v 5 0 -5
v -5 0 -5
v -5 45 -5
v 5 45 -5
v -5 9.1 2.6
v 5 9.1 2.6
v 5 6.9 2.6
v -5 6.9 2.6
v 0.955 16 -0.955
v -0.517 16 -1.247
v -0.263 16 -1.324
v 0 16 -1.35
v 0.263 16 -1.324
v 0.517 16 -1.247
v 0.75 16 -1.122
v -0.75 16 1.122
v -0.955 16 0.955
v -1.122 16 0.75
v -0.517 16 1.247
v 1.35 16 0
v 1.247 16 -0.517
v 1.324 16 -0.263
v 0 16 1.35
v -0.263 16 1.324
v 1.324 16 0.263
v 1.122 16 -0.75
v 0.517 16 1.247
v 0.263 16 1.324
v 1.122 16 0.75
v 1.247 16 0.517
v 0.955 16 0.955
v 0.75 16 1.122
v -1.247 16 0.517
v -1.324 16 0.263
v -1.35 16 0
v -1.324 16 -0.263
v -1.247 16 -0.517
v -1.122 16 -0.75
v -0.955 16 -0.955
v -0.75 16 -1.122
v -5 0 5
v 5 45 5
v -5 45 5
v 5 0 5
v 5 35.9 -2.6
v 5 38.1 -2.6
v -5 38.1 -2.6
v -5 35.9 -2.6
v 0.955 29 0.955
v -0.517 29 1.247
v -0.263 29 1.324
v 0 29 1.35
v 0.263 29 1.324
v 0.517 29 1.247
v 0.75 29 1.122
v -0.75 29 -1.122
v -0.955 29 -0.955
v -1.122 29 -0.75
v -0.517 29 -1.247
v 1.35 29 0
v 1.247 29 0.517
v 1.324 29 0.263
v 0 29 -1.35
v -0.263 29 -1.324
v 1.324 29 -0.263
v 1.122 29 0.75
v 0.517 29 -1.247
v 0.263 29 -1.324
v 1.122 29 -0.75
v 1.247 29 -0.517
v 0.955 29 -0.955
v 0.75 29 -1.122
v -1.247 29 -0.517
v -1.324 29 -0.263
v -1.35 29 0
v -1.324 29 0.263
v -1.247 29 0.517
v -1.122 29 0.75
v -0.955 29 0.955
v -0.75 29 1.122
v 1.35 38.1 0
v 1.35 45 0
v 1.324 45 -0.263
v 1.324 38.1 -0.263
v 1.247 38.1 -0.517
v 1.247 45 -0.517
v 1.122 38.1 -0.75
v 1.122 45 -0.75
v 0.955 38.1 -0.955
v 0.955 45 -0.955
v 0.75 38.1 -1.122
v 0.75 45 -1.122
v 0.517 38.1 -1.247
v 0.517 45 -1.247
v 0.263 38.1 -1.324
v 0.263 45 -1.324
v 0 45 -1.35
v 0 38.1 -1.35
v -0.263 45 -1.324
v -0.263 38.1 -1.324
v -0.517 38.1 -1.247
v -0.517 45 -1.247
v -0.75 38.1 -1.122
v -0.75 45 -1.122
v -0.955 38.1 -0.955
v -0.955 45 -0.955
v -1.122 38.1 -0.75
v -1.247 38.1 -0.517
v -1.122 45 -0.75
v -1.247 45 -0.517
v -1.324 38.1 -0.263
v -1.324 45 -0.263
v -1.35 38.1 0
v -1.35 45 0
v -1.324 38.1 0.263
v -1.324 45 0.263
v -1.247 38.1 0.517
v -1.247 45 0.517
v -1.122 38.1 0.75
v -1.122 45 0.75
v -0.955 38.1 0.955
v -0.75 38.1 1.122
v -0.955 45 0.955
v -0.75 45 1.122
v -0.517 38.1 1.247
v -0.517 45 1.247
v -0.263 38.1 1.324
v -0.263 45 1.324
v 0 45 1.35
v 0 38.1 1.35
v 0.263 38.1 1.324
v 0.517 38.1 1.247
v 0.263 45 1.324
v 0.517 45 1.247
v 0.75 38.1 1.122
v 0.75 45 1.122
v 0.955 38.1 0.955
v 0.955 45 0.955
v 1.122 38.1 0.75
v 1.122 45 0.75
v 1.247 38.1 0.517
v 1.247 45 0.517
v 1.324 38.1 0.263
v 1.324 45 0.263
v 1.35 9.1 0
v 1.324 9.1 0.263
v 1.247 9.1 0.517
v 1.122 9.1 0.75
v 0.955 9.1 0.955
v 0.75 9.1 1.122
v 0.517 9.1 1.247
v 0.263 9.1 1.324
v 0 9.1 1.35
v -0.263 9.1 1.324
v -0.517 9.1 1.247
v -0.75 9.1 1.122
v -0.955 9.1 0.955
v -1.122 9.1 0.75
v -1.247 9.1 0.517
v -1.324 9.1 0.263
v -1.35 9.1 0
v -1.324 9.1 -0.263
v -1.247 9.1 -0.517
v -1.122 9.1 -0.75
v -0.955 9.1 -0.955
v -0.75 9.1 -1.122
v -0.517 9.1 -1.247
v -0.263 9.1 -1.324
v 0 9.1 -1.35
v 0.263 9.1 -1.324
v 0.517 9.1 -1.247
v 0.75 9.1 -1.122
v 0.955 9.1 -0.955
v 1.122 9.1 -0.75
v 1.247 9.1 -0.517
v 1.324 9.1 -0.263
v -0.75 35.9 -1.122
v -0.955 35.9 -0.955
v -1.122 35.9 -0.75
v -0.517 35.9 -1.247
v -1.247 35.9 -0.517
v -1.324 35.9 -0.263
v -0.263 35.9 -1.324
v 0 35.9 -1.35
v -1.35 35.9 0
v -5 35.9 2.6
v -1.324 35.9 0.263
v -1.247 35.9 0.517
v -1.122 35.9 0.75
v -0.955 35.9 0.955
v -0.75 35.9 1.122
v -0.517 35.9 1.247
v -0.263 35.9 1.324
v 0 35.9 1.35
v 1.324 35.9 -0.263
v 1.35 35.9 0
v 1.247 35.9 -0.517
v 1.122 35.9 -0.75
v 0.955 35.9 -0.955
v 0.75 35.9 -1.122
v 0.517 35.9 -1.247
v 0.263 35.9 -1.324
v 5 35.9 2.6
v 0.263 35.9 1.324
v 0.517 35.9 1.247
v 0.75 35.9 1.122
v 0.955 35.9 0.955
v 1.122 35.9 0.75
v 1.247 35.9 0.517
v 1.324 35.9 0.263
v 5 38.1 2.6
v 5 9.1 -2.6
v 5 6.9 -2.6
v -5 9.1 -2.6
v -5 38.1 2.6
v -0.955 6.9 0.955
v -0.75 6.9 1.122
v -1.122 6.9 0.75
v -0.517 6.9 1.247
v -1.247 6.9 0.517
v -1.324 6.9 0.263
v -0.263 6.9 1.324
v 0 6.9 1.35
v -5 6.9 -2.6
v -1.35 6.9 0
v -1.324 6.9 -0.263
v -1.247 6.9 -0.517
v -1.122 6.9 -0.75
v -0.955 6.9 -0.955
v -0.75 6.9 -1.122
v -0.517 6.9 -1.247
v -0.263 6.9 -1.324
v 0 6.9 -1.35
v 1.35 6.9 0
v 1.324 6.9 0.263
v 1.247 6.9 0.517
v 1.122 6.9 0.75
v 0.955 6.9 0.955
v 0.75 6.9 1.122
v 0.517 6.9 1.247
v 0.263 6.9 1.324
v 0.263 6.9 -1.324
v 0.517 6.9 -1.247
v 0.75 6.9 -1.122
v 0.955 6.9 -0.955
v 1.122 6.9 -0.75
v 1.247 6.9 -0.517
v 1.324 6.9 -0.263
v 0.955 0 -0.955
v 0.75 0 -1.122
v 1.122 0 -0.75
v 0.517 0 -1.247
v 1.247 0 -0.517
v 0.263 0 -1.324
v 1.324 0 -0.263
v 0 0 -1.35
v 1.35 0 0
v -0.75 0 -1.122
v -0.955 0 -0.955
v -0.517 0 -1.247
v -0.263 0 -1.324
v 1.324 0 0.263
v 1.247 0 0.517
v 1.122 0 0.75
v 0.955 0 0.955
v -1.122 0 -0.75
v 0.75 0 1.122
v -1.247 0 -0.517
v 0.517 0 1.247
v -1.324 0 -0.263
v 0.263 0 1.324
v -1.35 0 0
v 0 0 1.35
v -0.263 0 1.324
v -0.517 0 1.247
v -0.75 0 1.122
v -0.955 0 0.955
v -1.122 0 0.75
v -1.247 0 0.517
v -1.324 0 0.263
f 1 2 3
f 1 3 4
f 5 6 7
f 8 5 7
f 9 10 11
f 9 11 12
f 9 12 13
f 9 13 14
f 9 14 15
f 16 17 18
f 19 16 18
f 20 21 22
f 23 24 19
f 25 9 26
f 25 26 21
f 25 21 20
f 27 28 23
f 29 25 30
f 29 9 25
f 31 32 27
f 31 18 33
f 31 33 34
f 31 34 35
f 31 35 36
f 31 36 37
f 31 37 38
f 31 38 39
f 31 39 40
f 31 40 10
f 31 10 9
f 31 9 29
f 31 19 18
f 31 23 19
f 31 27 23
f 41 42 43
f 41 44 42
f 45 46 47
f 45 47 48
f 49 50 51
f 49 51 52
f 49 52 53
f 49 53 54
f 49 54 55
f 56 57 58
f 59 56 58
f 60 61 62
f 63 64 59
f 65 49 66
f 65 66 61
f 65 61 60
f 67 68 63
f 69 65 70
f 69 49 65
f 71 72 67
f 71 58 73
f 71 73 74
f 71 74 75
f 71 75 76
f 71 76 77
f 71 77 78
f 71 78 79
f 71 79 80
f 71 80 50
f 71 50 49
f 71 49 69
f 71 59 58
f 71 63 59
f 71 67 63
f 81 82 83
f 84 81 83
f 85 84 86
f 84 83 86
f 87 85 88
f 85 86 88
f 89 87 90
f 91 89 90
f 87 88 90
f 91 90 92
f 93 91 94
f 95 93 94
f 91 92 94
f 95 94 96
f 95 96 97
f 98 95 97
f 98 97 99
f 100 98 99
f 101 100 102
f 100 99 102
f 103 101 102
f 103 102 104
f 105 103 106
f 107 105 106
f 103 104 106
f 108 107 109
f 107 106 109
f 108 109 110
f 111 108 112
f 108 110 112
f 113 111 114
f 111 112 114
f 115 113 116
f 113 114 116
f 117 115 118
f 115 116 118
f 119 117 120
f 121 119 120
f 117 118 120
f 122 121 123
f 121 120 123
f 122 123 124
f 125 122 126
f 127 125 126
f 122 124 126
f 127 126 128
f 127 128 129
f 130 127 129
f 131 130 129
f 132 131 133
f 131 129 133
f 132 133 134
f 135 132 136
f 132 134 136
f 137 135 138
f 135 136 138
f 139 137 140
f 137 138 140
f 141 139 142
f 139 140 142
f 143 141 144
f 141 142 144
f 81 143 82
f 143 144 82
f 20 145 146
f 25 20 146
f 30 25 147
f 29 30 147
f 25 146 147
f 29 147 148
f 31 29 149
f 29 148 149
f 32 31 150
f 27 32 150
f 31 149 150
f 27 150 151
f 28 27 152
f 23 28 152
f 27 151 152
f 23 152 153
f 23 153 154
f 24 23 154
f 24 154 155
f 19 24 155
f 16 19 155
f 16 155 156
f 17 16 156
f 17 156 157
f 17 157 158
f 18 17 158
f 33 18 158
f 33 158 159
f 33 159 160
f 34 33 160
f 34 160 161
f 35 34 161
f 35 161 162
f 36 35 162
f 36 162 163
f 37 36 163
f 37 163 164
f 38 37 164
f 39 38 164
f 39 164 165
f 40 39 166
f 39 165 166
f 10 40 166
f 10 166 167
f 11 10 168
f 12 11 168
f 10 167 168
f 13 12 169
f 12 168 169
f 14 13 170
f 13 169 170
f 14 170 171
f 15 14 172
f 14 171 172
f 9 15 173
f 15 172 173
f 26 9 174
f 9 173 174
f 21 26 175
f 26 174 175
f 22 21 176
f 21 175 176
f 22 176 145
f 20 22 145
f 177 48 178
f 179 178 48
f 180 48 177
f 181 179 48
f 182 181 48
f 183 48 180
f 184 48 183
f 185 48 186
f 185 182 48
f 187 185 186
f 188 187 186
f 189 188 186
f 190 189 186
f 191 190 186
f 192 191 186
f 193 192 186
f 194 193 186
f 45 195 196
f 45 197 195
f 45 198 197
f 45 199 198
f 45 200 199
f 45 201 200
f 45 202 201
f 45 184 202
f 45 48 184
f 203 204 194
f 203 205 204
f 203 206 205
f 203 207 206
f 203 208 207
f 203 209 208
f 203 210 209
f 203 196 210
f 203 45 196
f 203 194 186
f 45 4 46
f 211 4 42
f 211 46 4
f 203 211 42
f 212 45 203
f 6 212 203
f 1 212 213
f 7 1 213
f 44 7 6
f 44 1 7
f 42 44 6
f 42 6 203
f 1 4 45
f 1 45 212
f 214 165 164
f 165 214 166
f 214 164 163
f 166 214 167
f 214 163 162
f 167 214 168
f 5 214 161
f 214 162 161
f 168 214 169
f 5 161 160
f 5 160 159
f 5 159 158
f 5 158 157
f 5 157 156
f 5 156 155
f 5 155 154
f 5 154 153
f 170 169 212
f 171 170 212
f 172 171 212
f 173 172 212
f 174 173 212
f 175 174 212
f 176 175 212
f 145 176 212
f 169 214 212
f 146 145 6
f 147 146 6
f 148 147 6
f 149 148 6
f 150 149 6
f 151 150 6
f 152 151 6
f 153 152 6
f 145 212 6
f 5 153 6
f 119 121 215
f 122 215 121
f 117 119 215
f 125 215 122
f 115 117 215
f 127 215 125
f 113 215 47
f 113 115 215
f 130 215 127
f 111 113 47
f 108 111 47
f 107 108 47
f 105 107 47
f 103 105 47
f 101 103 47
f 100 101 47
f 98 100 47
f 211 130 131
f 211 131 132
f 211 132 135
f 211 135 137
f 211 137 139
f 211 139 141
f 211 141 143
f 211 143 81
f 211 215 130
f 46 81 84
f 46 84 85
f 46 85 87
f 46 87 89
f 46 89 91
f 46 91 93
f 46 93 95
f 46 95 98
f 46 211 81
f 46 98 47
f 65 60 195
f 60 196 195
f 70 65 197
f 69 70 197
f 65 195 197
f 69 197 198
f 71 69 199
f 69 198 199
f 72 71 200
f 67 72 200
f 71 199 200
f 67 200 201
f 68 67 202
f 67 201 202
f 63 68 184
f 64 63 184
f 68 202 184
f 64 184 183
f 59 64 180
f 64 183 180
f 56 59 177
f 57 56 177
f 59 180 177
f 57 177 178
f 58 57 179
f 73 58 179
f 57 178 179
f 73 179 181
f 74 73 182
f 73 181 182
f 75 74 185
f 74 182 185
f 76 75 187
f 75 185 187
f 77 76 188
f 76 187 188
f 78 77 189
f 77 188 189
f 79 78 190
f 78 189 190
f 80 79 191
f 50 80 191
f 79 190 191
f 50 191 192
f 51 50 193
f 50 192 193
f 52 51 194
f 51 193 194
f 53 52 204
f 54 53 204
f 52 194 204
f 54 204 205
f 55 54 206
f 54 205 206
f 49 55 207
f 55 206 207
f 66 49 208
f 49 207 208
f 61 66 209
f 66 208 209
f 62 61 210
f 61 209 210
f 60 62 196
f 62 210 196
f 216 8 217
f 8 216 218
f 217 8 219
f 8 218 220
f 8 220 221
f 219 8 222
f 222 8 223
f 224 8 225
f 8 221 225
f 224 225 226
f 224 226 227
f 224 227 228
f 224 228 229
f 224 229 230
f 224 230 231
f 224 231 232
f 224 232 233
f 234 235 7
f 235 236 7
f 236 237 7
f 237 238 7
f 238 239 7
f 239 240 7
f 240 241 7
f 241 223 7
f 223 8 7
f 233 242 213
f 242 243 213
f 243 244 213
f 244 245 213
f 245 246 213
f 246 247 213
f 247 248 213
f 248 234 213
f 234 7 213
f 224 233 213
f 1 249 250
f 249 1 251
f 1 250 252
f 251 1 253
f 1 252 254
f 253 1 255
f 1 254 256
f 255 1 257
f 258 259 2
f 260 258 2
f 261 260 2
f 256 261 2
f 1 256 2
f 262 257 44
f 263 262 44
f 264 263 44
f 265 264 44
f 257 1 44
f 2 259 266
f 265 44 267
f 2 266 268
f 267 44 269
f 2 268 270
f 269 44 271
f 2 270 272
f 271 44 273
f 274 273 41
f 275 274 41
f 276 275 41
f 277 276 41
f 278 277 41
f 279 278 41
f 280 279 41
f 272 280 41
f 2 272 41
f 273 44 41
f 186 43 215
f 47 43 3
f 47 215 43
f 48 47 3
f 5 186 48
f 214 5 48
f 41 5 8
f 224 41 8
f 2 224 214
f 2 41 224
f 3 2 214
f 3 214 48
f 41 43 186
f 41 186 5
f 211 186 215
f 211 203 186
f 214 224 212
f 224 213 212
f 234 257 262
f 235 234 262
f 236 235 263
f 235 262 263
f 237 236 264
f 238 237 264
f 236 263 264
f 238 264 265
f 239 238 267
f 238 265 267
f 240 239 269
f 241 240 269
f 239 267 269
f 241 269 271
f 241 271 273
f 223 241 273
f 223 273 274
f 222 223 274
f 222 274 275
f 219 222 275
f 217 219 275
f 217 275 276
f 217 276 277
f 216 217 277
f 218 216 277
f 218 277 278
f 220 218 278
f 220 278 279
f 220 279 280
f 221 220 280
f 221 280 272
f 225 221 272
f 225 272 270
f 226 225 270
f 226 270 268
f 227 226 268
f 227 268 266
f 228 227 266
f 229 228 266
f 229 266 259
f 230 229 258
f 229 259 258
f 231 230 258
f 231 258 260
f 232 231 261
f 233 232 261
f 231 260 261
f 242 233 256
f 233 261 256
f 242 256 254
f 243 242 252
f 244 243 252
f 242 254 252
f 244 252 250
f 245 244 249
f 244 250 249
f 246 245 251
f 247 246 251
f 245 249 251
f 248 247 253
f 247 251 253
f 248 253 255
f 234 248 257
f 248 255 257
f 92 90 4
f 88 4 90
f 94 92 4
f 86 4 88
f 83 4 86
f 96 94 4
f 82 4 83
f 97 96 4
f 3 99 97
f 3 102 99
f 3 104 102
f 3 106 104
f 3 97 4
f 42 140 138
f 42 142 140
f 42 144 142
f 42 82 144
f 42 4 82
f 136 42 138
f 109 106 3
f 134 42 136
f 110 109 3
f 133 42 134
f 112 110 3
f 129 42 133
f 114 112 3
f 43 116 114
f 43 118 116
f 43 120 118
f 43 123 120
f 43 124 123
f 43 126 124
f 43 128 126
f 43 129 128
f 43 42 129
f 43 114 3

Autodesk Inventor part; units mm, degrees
ref_plane "YZ Plane" through (0, 0, 0) normal (1, 0, 0) x (0, 1, 0)
ref_plane "XZ Plane" through (0, 0, 0) normal (0, 1, 0) x (-1, 0, 0)
ref_plane "XY Plane" through (0, 0, 0) normal (0, 0, 1) x (1, 0, 0)
sketch "스케치1" plane through (0, 0, 0) normal (0, 1, 0) x (-1, 0, 0)
  line L0 (-5, 5) -> (5, 5)
  line L1 (5, 5) -> (5, -5)
  line L2 (5, -5) -> (-5, -5)
  line L3 (-5, -5) -> (-5, 5)
  line L4 (-5, 5) -> (5, -5) construction
  line L5 (5, 5) -> (-5, -5) construction
  circle A0 centre (0, 0) radius 1.35
  dimension "d0" = 10
  dimension "d1" = 10
  dimension "d2" = 2.7
extrude "돌출1" add sketch "스케치1" along normal blind 45 contours L0 L1 L2 L3 | A0
sketch "스케치2" plane through (0, 0, 0) normal (0, -1, 0) x (1, 0, 0)
  circle A0 centre (0, 0) radius 1.35
  dimension "d5" = 2.7
extrude "돌출2" cut sketch "스케치2" against normal blind 16
sketch "스케치3" plane through (0, 45, 0) normal (0, 1, 0) x (1, 0, 0)
  circle A0 centre (0, 0) radius 1.35
  dimension "d8" = 2.7
extrude "돌출3" cut sketch "스케치3" against normal blind 16
sketch "스케치4" plane through (5, 0, 5) normal (1, 0, 0) x (0, 0, -1)
  line L0 (0, 45) -> (10, 45) projected
  line L1 (10, 45) -> (0, 45) projected
  line L2 (3.65, 45) -> (6.35, 45) projected
  line L3 (3.65, 29) -> (6.35, 29) projected
  line L4 (3.65, 45) -> (6.35, 45) projected
  line L5 (10, 45) -> (0, 45) projected
  line L6 (0, 45) -> (10, 45) projected
  line L7 (3.65, 29) -> (6.35, 29) projected
  line L8 (3.65, 29) -> (6.35, 29) projected
  line L9 (3.65, 45) -> (6.35, 45) projected
  line L10 (10, 0) -> (0, 0) projected
  line L11 (0, 0) -> (10, 0) projected
  line L12 (6.35, 0) -> (3.65, 0) projected
  line L13 (6.35, 16) -> (3.65, 16) projected
  line L14 (6.35, 0) -> (3.65, 0) projected
  line L15 (0, 0) -> (10, 0) projected
  line L16 (10, 0) -> (0, 0) projected
  line L17 (6.35, 16) -> (3.65, 16) projected
  line L18 (6.35, 16) -> (3.65, 16) projected
  line L19 (6.35, 0) -> (3.65, 0) projected
  line L20 (10, 0) -> (10, 45) projected
  line L21 (0, 0) -> (0, 45) projected
  line L22 (0, 0) -> (0, 45) projected
  line L23 (10, 0) -> (10, 45) projected
  line L24 (10, 0) -> (10, 45) projected
  line L25 (10, 0) -> (10, 45) projected
  line L26 (10, 0) -> (0, 0) projected
  line L27 (0, 0) -> (0, 45) projected
  line L28 (10, 45) -> (0, 45) projected
  line L29 (10, 0) -> (10, 45) projected
  line L30 (0, 0) -> (0, 45) projected
  line L31 (0, 0) -> (0, 45) projected
  line L32 (0, 0) -> (10, 0) projected
  line L33 (10, 0) -> (10, 45) projected
  line L34 (0, 45) -> (10, 45) projected
  line L35 (0, 0) -> (0, 45) projected
  line L36 (3.65, 45) -> (3.65, 29) projected
  line L37 (6.35, 45) -> (6.35, 29) projected
  line L38 (3.65, 0) -> (3.65, 16) projected
  line L39 (6.35, 0) -> (6.35, 16) projected
  line L40 (2.4, 38.1) -> (7.6, 38.1)
  line L41 (7.6, 38.1) -> (7.6, 35.9)
  line L42 (7.6, 35.9) -> (2.4, 35.9)
  line L43 (2.4, 35.9) -> (2.4, 38.1)
  line L44 (2.4, 38.1) -> (7.6, 35.9) construction
  line L45 (7.6, 38.1) -> (2.4, 35.9) construction
  line L46 (2.4, 6.9) -> (7.6, 6.9)
  line L47 (7.6, 6.9) -> (7.6, 9.1)
  line L48 (7.6, 9.1) -> (2.4, 9.1)
  line L49 (2.4, 9.1) -> (2.4, 6.9)
  line L50 (2.4, 6.9) -> (7.6, 9.1) construction
  line L51 (7.6, 6.9) -> (2.4, 9.1) construction
  point P0 (5, 0)
  point P1 (5, 37)
  point P2 (5, 8)
  dimension "d11" = 5.2
  dimension "d12" = 2.2
  dimension "d13" = 5.2
  dimension "d14" = 2.2
extrude "돌출4" cut sketch "스케치4" against normal blind 16 contours L40 L37 L42 L36 | L36 L42 L43 L40 | L40 L41 L42 L37 | L46 L49 L48 L38 | L38 L48 L39 L46 | L39 L48 L47 L46
properties part number "frame_head2" material "PMMA 플라스틱"
